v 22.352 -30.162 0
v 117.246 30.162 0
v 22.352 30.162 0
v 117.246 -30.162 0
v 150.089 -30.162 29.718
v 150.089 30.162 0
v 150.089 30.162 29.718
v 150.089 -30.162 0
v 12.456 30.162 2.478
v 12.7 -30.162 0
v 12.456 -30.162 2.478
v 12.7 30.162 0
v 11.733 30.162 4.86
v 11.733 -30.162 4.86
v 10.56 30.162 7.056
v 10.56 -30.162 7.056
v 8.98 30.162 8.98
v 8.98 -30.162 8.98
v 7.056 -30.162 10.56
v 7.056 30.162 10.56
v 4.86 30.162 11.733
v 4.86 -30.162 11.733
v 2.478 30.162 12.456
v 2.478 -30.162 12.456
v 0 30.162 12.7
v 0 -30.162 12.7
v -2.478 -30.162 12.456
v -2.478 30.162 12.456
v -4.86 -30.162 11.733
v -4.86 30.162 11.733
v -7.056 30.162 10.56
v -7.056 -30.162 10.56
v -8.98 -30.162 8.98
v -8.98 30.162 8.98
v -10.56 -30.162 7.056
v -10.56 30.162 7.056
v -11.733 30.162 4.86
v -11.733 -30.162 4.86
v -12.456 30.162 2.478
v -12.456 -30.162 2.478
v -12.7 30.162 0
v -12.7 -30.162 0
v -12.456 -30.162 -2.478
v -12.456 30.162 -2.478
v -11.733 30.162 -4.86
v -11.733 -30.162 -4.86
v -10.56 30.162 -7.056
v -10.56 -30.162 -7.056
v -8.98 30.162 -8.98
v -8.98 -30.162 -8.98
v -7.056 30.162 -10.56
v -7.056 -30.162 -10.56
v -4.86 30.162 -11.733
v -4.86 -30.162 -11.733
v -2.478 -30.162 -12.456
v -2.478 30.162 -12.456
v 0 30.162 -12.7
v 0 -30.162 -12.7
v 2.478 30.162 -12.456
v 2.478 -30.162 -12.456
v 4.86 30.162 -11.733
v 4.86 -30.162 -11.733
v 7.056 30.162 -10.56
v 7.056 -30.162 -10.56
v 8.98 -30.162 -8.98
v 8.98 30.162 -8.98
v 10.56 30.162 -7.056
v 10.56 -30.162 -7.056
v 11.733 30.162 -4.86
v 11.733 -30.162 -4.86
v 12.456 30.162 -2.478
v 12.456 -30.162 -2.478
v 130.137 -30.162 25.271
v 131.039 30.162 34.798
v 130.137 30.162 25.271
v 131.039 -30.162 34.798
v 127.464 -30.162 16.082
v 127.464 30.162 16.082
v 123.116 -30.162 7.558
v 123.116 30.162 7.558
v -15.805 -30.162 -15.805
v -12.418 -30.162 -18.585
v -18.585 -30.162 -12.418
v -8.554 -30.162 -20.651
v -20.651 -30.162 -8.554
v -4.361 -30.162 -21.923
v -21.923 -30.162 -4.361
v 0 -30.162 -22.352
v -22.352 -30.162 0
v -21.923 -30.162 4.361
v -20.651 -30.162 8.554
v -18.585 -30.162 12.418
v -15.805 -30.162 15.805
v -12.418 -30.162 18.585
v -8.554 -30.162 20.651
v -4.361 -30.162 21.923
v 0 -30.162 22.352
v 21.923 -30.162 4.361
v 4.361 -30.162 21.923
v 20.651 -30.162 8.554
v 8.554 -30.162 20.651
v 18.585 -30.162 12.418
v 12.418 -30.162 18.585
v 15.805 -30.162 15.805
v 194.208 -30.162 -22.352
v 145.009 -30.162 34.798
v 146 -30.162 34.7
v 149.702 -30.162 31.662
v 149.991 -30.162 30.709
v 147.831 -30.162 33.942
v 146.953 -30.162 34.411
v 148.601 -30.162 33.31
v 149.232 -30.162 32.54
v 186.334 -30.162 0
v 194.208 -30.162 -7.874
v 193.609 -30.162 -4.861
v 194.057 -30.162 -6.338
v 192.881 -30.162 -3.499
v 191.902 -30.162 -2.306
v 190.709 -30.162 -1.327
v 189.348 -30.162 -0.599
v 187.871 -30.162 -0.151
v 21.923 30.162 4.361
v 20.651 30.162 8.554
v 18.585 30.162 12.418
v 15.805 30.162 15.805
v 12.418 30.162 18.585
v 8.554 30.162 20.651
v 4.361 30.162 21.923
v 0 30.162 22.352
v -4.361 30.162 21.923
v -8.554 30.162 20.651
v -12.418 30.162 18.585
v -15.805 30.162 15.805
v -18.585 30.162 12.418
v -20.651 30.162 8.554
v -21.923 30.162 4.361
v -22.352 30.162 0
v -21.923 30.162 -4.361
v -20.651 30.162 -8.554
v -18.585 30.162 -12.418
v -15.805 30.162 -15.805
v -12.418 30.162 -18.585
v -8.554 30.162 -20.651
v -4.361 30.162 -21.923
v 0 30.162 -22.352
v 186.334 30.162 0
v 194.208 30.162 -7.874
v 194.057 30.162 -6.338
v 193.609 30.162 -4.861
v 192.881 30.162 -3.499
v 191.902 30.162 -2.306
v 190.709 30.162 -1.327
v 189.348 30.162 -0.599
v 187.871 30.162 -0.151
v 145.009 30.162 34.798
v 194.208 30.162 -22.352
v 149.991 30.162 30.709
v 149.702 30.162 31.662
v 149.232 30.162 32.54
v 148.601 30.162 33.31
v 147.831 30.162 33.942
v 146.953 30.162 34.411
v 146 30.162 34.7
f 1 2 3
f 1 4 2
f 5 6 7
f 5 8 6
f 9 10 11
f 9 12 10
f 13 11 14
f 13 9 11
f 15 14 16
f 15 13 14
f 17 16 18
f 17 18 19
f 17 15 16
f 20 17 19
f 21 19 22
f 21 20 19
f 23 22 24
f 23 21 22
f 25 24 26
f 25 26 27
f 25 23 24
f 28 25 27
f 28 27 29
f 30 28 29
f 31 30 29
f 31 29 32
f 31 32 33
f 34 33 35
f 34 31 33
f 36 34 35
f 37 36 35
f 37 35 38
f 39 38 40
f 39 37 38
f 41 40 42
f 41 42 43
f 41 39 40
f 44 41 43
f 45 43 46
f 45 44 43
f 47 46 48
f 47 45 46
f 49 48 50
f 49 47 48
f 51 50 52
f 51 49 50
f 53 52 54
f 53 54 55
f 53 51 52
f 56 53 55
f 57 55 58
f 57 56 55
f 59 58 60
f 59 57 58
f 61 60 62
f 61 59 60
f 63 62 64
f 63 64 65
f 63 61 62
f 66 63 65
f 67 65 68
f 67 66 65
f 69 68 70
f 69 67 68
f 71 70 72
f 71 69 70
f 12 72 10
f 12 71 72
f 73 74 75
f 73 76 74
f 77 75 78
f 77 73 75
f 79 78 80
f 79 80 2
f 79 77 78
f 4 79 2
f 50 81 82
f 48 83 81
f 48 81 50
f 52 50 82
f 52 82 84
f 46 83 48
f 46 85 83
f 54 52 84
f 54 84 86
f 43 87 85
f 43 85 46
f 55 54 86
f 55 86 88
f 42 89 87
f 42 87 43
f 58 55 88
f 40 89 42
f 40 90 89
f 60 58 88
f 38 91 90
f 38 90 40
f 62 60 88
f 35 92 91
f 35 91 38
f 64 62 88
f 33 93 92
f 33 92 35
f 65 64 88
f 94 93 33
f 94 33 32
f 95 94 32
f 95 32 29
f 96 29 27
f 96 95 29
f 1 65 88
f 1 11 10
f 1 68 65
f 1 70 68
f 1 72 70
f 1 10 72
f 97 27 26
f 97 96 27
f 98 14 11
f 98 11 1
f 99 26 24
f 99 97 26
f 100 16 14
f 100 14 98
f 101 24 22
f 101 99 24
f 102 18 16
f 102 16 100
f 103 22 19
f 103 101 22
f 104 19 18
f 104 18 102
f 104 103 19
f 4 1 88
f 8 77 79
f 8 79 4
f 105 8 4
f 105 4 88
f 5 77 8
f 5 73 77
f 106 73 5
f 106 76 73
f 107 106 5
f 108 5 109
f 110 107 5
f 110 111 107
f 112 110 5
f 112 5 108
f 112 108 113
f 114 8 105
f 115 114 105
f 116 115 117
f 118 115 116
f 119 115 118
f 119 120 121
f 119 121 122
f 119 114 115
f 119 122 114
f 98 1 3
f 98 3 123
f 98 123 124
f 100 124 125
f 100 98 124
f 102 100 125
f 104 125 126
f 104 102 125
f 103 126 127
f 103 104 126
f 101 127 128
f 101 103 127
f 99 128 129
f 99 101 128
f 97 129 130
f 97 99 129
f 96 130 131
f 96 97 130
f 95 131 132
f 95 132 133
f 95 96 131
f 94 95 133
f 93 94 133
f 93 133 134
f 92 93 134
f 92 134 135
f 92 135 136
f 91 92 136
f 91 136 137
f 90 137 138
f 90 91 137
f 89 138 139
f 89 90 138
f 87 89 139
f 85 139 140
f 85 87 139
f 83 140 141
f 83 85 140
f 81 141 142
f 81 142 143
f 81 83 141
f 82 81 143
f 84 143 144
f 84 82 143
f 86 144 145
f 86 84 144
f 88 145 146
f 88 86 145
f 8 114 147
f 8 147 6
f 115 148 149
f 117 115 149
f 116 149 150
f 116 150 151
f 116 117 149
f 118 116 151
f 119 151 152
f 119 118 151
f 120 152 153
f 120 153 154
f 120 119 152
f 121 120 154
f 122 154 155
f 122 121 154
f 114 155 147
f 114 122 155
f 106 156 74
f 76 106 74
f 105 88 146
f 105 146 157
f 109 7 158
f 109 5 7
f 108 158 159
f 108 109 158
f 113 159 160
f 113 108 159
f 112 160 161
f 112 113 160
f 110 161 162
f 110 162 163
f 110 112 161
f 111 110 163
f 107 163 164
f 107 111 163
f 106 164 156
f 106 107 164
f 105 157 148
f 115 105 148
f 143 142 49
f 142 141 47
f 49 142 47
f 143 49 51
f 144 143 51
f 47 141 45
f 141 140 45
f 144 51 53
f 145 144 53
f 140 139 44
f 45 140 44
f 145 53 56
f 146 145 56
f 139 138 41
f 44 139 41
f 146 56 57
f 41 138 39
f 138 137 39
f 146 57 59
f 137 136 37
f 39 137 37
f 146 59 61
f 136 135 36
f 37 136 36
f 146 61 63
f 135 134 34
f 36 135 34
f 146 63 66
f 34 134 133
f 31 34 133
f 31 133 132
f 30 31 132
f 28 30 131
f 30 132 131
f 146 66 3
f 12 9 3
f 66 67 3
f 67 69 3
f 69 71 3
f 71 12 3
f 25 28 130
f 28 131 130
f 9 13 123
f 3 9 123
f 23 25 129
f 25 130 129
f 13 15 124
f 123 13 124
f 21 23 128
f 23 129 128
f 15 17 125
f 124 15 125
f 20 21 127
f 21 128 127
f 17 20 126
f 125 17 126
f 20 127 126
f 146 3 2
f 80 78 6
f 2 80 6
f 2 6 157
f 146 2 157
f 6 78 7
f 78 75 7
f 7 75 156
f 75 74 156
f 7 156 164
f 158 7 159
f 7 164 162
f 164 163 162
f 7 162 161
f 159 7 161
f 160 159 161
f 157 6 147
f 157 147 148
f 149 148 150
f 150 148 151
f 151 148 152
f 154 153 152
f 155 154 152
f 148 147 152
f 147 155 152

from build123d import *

# Parameters (mm, degrees)
F0_R     = 12.7
F1_DEPTH = 30.1625


with BuildPart() as f1:
    # F0 (on Front) → F1 (new body, symmetric)
    with BuildSketch(Plane.XZ):
        with BuildLine():
            Line((117.2464, 0), (22.352, 0))
            ThreePointArc((22.352, 0), (-15.805251, 15.805251), (0, -22.352))
            Line((0, -22.352), (194.2084, -22.352))
            Line((194.2084, -22.352), (194.2084, -7.874))
            ThreePointArc((194.2084, -7.874), (191.902159, -2.306241), (186.3344, 0))
            Line((186.3344, 0), (150.0886, 0))
            Line((150.0886, 0), (150.0886, 29.718))
            ThreePointArc((150.0886, 29.718), (148.600702, 33.310102), (145.0086, 34.798))
            Line((145.0086, 34.798), (131.0386, 34.798))
            ThreePointArc((131.0386, 34.798), (127.464415, 16.082358), (117.2464, 0))
        make_face()
        Circle(F0_R, mode=Mode.SUBTRACT)
    extrude(amount=F1_DEPTH, both=True)


solid = f1.part
